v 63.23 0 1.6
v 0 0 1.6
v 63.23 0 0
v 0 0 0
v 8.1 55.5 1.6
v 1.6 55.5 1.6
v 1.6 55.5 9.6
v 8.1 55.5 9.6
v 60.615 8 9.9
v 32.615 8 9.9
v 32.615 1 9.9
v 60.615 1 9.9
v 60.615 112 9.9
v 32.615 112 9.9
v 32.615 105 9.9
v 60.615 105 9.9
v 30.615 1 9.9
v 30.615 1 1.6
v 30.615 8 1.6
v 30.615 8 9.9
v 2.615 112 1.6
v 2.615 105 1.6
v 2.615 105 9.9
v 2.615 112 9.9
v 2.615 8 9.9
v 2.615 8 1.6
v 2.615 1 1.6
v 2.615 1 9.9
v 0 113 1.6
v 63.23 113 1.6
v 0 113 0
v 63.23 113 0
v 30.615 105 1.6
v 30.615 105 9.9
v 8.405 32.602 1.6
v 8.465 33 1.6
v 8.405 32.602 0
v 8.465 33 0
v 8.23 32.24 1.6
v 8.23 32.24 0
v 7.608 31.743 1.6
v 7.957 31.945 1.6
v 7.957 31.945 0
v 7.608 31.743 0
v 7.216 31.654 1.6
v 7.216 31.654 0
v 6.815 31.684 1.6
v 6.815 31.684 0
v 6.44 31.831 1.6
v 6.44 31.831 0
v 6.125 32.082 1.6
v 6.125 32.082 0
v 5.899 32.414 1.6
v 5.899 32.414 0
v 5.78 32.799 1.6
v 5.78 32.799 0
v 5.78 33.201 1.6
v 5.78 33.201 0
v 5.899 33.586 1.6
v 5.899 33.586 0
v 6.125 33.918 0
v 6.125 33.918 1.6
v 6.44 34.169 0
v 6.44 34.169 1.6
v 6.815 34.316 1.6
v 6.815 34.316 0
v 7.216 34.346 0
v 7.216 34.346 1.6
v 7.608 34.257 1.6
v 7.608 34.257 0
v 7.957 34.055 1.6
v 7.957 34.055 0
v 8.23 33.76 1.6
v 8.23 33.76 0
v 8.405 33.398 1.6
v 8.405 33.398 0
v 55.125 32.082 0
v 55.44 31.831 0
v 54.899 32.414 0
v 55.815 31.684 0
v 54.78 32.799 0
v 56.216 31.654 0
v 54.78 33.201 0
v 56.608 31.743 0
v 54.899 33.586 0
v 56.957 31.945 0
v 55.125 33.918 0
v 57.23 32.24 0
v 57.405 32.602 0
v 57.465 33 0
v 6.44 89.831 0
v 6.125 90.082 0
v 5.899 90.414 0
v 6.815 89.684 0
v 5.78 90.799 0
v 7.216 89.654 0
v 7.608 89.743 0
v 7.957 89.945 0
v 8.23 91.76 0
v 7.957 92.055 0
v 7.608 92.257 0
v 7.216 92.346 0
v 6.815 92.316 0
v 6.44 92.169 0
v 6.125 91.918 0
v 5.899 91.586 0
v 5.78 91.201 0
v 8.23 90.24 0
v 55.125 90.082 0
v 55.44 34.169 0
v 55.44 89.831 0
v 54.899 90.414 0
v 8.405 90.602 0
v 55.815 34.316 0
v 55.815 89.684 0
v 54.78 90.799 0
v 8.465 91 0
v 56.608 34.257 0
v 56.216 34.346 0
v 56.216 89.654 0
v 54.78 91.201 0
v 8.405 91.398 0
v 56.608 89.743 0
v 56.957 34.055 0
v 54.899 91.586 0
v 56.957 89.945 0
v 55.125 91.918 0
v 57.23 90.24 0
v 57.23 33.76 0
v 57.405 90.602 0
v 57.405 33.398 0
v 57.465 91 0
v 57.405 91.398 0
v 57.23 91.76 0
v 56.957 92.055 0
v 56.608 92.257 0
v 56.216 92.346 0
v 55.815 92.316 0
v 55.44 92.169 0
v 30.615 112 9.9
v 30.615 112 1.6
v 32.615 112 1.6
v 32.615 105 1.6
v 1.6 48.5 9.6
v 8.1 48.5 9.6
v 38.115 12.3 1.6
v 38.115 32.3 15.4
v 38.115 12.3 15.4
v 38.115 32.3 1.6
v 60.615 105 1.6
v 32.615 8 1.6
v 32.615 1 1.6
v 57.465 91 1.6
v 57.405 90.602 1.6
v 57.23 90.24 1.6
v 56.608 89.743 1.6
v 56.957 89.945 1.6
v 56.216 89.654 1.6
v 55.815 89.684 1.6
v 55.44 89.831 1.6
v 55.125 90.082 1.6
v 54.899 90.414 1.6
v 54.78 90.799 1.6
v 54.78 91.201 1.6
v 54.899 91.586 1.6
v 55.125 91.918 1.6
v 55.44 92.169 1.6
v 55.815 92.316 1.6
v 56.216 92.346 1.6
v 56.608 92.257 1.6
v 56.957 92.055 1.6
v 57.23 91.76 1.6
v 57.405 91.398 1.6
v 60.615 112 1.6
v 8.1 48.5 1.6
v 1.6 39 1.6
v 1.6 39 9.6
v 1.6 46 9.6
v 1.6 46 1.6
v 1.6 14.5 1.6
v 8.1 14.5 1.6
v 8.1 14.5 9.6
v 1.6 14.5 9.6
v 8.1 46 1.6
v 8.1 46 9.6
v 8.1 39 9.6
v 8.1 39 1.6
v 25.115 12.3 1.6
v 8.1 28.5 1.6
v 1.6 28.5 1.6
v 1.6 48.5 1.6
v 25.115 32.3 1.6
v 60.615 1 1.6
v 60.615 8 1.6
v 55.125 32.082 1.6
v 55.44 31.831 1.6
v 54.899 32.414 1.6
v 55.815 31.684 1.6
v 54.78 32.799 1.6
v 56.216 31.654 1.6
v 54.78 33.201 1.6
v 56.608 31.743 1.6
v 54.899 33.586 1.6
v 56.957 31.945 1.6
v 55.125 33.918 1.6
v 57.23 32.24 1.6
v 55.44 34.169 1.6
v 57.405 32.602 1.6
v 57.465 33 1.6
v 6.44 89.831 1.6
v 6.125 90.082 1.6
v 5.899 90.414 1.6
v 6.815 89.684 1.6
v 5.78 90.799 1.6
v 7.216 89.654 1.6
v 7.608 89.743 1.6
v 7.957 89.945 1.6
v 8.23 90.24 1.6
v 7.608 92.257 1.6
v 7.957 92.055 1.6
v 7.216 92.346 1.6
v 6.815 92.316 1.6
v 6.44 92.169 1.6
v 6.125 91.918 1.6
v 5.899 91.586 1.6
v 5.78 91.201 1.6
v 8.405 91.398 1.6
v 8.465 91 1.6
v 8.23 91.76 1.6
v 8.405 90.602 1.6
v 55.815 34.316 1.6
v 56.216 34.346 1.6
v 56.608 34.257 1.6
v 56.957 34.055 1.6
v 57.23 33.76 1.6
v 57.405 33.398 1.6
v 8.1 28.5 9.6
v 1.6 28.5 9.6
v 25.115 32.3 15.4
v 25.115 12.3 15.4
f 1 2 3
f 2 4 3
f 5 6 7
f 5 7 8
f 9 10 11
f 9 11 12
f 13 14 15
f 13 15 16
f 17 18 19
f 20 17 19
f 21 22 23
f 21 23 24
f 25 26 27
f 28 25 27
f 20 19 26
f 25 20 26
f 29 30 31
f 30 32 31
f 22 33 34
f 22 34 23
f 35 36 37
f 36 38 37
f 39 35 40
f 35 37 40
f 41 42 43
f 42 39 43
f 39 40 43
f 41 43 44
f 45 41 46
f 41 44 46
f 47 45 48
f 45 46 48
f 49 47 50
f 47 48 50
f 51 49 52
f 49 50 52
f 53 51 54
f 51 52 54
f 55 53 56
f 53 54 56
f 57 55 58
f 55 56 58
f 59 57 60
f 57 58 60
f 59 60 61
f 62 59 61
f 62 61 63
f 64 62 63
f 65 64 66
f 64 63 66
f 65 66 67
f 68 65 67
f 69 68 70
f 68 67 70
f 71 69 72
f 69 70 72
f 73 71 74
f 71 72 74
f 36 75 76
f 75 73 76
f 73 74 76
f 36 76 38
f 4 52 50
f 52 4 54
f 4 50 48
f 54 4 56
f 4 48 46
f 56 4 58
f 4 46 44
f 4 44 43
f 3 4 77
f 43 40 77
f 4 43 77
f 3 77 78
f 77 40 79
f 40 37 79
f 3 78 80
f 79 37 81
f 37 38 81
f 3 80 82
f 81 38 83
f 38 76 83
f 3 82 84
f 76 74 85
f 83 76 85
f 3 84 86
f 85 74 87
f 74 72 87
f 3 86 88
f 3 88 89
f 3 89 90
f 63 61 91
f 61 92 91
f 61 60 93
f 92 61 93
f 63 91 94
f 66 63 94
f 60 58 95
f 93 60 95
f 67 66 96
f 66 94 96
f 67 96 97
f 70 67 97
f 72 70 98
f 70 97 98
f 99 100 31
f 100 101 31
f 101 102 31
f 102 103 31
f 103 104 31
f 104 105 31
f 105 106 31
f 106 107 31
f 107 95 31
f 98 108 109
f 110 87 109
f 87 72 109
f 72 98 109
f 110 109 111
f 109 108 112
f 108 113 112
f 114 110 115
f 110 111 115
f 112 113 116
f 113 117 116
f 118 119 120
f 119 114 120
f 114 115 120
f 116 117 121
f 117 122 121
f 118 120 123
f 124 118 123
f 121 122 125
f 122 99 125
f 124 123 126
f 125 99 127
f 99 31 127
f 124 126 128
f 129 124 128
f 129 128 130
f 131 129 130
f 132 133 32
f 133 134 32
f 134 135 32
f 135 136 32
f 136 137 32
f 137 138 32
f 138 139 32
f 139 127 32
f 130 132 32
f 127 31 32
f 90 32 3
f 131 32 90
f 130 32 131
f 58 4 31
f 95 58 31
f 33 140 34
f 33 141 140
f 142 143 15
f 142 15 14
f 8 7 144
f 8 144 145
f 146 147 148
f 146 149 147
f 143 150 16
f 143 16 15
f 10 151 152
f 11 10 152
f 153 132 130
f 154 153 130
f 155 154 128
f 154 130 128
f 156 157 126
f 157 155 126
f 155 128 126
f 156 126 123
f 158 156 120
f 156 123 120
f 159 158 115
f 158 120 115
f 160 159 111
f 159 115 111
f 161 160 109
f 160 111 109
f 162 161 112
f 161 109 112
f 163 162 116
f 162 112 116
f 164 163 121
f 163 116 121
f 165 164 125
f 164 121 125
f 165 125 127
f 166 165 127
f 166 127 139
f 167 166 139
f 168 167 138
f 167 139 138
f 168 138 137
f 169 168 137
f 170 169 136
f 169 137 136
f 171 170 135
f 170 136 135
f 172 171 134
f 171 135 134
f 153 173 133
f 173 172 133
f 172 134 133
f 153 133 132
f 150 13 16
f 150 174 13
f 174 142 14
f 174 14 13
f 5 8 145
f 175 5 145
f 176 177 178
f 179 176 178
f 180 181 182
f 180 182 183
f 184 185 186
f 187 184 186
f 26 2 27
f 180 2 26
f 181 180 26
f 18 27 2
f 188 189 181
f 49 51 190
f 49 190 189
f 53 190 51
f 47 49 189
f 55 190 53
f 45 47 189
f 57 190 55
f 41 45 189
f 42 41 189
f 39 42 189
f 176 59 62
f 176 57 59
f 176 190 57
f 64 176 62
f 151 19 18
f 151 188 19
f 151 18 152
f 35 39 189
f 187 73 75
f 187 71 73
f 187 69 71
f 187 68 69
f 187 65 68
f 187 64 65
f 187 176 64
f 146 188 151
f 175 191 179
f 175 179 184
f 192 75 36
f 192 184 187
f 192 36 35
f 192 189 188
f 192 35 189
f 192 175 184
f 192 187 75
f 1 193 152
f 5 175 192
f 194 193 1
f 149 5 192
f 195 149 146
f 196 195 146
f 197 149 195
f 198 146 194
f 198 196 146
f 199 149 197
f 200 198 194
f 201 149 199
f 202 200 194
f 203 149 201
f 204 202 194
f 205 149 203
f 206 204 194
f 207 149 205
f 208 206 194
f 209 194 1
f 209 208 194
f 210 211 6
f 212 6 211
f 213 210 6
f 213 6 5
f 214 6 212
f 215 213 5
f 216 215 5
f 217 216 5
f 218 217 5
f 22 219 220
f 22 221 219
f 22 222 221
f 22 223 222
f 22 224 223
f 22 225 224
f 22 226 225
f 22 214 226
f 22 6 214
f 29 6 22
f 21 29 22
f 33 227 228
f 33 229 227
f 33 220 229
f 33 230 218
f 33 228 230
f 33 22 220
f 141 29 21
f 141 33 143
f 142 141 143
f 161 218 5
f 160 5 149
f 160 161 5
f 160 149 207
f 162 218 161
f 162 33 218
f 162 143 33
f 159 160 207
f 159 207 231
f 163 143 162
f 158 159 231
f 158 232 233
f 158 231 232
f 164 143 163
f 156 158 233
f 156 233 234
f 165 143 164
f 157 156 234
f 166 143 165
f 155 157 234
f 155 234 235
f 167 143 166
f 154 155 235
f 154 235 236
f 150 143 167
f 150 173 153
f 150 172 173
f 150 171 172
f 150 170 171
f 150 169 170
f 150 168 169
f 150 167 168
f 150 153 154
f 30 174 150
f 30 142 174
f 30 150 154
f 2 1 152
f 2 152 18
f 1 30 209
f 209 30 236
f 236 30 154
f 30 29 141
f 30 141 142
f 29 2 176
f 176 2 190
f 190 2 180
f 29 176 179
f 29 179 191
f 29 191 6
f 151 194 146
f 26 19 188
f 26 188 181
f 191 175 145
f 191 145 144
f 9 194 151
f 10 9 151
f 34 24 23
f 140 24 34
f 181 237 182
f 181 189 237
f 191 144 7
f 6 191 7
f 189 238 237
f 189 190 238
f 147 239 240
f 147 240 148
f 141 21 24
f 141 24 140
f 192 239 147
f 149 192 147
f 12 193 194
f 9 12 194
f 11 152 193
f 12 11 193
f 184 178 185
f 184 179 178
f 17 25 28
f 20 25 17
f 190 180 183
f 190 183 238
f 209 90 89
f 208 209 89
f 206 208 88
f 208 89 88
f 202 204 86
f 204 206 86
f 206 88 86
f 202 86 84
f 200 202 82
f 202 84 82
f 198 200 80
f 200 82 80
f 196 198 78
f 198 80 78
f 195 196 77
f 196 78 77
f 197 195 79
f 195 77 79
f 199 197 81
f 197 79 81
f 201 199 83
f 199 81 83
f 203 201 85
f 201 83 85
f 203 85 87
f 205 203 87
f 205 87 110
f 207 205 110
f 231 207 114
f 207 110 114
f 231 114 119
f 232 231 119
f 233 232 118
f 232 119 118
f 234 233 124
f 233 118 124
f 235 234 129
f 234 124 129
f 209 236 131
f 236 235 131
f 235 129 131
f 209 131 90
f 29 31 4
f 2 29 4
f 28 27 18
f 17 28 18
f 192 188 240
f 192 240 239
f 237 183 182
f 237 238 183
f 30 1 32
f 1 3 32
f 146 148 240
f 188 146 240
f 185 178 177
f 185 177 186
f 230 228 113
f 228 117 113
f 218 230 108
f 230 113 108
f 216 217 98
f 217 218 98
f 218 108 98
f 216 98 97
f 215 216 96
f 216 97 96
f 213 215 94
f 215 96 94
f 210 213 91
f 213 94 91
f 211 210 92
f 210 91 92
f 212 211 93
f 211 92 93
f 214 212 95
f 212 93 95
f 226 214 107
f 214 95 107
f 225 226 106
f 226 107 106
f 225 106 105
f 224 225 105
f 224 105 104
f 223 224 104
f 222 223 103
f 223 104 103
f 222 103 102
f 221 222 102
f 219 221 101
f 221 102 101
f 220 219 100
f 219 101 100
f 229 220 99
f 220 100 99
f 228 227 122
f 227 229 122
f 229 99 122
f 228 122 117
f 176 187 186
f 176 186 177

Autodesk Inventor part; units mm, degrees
ref_plane "YZ Plane" through (0, 0, 0) normal (1, 0, 0) x (0, 1, 0)
ref_plane "XZ Plane" through (0, 0, 0) normal (0, 1, 0) x (-1, 0, 0)
ref_plane "XY Plane" through (0, 0, 0) normal (0, 0, 1) x (1, 0, 0)
sketch "Sketch1" plane through (0, 0, 0) normal (0, 0, 1) x (1, 0, 0)
  line L0 (0, 0) -> (63.23, 0)
  line L1 (63.23, 0) -> (63.23, 113)
  line L2 (63.23, 113) -> (0, 113)
  line L3 (0, 113) -> (0, 0)
  line L4 (7.115, 91) -> (56.115, 91) construction
  line L5 (56.115, 91) -> (56.115, 33) construction
  line L6 (56.115, 33) -> (7.115, 33) construction
  line L7 (7.115, 33) -> (7.115, 91) construction
  circle A0 centre (7.115, 91) radius 1.35
  circle A1 centre (56.115, 91) radius 1.35
  circle A2 centre (56.115, 33) radius 1.35
  circle A3 centre (7.115, 33) radius 1.35
  point P0 (31.615, 91)
  point P1 (31.615, 113)
  dimension "d0" = 63.23
  dimension "d1" = 113
  dimension "d2" = 49
  dimension "d3" = 58
  dimension "d4" = 2.7
  dimension "d5" = 22
extrude "Extrusion1" add sketch "Sketch1" along normal blind 1.6
sketch "Sketch2" plane through (0, 0, 1.6) normal (0, 0, 1) x (1, 0, 0)
  point P0 (0, 0)
sketch "Sketch3" plane through (0, 0, 1.6) normal (0, 0, 1) x (1, 0, 0)
  line L0 (2.615, 112) -> (30.615, 112)
  line L1 (30.615, 112) -> (30.615, 105)
  line L2 (30.615, 105) -> (2.615, 105)
  line L3 (2.615, 105) -> (2.615, 112)
  line L4 (32.615, 112) -> (60.615, 112)
  line L5 (60.615, 112) -> (60.615, 105)
  line L6 (60.615, 105) -> (32.615, 105)
  line L7 (32.615, 105) -> (32.615, 112)
  line L8 (2.615, 1) -> (30.615, 1)
  line L9 (30.615, 1) -> (30.615, 8)
  line L10 (30.615, 8) -> (2.615, 8)
  line L11 (2.615, 8) -> (2.615, 1)
  line L12 (32.615, 1) -> (60.615, 1)
  line L13 (60.615, 1) -> (60.615, 8)
  line L14 (60.615, 8) -> (32.615, 8)
  line L15 (32.615, 8) -> (32.615, 1)
  line L16 (63.23, 113) -> (0, 113) construction
  line L17 (0, 0) -> (63.23, 0) construction
  line L18 (0, 113) -> (0, 0) construction
  dimension "d8" = 28
  dimension "d9" = 2
  dimension "d10" = 2
  dimension "d11" = 7
  dimension "d12" = 1
  dimension "d13" = 1
  dimension "d14" = 63.23
  dimension "d15" = 2.615
  dimension "d16" = 2.615
extrude "Extrusion2" add sketch "Sketch3" along normal blind 8.3
sketch "Sketch4" plane through (0, 0, 1.6) normal (0, 0, 1) x (1, 0, 0)
  line L0 (1.6, 28.5) -> (8.1, 28.5)
  line L1 (8.1, 28.5) -> (8.1, 14.5)
  line L2 (8.1, 14.5) -> (1.6, 14.5)
  line L3 (1.6, 14.5) -> (1.6, 28.5)
  line L4 (0, 0) -> (63.23, 0) construction
  line L5 (0, 113) -> (0, 0) projected
  line L6 (1.6, 55.5) -> (8.1, 55.5)
  line L7 (8.1, 55.5) -> (8.1, 48.5)
  line L8 (8.1, 48.5) -> (1.6, 48.5)
  line L9 (1.6, 48.5) -> (1.6, 55.5)
  line L10 (1.6, 46) -> (8.1, 46)
  line L11 (8.1, 46) -> (8.1, 39)
  line L12 (8.1, 39) -> (1.6, 39)
  line L13 (1.6, 39) -> (1.6, 46)
  dimension "d19" = 6.5
  dimension "d20" = 14
  dimension "d21" = 28.5
  dimension "d22" = 1.6
  dimension "d30" = 7
  dimension "d31" = 7
  dimension "d32" = 10.5
  dimension "d33" = 2.5
extrude "Extrusion3" add sketch "Sketch4" along normal blind 8
sketch "Sketch5" plane through (0, 0, 1.6) normal (0, 0, 1) x (1, 0, 0)
  line L0 (25.115, 32.3) -> (38.115, 32.3)
  line L1 (38.115, 32.3) -> (38.115, 12.3)
  line L2 (38.115, 12.3) -> (25.115, 12.3)
  line L3 (25.115, 12.3) -> (25.115, 32.3)
  line L4 (0, 0) -> (63.23, 0) construction
  point P0 (31.615, 12.3)
  point P1 (31.615, 0)
  dimension "d25" = 12.3
  dimension "d26" = 13
  dimension "d27" = 20
extrude "Extrusion4" add sketch "Sketch5" along normal blind 13.8
equation "\"d10\" = d9"
equation "\"d13\" = d12"
equation "\"d15\" = -0.5 * d9 + 0.5 * d14 - d8"
equation "\"d16\" = d15"
equation "\"d31\" = d30"
properties part number "PCB"
